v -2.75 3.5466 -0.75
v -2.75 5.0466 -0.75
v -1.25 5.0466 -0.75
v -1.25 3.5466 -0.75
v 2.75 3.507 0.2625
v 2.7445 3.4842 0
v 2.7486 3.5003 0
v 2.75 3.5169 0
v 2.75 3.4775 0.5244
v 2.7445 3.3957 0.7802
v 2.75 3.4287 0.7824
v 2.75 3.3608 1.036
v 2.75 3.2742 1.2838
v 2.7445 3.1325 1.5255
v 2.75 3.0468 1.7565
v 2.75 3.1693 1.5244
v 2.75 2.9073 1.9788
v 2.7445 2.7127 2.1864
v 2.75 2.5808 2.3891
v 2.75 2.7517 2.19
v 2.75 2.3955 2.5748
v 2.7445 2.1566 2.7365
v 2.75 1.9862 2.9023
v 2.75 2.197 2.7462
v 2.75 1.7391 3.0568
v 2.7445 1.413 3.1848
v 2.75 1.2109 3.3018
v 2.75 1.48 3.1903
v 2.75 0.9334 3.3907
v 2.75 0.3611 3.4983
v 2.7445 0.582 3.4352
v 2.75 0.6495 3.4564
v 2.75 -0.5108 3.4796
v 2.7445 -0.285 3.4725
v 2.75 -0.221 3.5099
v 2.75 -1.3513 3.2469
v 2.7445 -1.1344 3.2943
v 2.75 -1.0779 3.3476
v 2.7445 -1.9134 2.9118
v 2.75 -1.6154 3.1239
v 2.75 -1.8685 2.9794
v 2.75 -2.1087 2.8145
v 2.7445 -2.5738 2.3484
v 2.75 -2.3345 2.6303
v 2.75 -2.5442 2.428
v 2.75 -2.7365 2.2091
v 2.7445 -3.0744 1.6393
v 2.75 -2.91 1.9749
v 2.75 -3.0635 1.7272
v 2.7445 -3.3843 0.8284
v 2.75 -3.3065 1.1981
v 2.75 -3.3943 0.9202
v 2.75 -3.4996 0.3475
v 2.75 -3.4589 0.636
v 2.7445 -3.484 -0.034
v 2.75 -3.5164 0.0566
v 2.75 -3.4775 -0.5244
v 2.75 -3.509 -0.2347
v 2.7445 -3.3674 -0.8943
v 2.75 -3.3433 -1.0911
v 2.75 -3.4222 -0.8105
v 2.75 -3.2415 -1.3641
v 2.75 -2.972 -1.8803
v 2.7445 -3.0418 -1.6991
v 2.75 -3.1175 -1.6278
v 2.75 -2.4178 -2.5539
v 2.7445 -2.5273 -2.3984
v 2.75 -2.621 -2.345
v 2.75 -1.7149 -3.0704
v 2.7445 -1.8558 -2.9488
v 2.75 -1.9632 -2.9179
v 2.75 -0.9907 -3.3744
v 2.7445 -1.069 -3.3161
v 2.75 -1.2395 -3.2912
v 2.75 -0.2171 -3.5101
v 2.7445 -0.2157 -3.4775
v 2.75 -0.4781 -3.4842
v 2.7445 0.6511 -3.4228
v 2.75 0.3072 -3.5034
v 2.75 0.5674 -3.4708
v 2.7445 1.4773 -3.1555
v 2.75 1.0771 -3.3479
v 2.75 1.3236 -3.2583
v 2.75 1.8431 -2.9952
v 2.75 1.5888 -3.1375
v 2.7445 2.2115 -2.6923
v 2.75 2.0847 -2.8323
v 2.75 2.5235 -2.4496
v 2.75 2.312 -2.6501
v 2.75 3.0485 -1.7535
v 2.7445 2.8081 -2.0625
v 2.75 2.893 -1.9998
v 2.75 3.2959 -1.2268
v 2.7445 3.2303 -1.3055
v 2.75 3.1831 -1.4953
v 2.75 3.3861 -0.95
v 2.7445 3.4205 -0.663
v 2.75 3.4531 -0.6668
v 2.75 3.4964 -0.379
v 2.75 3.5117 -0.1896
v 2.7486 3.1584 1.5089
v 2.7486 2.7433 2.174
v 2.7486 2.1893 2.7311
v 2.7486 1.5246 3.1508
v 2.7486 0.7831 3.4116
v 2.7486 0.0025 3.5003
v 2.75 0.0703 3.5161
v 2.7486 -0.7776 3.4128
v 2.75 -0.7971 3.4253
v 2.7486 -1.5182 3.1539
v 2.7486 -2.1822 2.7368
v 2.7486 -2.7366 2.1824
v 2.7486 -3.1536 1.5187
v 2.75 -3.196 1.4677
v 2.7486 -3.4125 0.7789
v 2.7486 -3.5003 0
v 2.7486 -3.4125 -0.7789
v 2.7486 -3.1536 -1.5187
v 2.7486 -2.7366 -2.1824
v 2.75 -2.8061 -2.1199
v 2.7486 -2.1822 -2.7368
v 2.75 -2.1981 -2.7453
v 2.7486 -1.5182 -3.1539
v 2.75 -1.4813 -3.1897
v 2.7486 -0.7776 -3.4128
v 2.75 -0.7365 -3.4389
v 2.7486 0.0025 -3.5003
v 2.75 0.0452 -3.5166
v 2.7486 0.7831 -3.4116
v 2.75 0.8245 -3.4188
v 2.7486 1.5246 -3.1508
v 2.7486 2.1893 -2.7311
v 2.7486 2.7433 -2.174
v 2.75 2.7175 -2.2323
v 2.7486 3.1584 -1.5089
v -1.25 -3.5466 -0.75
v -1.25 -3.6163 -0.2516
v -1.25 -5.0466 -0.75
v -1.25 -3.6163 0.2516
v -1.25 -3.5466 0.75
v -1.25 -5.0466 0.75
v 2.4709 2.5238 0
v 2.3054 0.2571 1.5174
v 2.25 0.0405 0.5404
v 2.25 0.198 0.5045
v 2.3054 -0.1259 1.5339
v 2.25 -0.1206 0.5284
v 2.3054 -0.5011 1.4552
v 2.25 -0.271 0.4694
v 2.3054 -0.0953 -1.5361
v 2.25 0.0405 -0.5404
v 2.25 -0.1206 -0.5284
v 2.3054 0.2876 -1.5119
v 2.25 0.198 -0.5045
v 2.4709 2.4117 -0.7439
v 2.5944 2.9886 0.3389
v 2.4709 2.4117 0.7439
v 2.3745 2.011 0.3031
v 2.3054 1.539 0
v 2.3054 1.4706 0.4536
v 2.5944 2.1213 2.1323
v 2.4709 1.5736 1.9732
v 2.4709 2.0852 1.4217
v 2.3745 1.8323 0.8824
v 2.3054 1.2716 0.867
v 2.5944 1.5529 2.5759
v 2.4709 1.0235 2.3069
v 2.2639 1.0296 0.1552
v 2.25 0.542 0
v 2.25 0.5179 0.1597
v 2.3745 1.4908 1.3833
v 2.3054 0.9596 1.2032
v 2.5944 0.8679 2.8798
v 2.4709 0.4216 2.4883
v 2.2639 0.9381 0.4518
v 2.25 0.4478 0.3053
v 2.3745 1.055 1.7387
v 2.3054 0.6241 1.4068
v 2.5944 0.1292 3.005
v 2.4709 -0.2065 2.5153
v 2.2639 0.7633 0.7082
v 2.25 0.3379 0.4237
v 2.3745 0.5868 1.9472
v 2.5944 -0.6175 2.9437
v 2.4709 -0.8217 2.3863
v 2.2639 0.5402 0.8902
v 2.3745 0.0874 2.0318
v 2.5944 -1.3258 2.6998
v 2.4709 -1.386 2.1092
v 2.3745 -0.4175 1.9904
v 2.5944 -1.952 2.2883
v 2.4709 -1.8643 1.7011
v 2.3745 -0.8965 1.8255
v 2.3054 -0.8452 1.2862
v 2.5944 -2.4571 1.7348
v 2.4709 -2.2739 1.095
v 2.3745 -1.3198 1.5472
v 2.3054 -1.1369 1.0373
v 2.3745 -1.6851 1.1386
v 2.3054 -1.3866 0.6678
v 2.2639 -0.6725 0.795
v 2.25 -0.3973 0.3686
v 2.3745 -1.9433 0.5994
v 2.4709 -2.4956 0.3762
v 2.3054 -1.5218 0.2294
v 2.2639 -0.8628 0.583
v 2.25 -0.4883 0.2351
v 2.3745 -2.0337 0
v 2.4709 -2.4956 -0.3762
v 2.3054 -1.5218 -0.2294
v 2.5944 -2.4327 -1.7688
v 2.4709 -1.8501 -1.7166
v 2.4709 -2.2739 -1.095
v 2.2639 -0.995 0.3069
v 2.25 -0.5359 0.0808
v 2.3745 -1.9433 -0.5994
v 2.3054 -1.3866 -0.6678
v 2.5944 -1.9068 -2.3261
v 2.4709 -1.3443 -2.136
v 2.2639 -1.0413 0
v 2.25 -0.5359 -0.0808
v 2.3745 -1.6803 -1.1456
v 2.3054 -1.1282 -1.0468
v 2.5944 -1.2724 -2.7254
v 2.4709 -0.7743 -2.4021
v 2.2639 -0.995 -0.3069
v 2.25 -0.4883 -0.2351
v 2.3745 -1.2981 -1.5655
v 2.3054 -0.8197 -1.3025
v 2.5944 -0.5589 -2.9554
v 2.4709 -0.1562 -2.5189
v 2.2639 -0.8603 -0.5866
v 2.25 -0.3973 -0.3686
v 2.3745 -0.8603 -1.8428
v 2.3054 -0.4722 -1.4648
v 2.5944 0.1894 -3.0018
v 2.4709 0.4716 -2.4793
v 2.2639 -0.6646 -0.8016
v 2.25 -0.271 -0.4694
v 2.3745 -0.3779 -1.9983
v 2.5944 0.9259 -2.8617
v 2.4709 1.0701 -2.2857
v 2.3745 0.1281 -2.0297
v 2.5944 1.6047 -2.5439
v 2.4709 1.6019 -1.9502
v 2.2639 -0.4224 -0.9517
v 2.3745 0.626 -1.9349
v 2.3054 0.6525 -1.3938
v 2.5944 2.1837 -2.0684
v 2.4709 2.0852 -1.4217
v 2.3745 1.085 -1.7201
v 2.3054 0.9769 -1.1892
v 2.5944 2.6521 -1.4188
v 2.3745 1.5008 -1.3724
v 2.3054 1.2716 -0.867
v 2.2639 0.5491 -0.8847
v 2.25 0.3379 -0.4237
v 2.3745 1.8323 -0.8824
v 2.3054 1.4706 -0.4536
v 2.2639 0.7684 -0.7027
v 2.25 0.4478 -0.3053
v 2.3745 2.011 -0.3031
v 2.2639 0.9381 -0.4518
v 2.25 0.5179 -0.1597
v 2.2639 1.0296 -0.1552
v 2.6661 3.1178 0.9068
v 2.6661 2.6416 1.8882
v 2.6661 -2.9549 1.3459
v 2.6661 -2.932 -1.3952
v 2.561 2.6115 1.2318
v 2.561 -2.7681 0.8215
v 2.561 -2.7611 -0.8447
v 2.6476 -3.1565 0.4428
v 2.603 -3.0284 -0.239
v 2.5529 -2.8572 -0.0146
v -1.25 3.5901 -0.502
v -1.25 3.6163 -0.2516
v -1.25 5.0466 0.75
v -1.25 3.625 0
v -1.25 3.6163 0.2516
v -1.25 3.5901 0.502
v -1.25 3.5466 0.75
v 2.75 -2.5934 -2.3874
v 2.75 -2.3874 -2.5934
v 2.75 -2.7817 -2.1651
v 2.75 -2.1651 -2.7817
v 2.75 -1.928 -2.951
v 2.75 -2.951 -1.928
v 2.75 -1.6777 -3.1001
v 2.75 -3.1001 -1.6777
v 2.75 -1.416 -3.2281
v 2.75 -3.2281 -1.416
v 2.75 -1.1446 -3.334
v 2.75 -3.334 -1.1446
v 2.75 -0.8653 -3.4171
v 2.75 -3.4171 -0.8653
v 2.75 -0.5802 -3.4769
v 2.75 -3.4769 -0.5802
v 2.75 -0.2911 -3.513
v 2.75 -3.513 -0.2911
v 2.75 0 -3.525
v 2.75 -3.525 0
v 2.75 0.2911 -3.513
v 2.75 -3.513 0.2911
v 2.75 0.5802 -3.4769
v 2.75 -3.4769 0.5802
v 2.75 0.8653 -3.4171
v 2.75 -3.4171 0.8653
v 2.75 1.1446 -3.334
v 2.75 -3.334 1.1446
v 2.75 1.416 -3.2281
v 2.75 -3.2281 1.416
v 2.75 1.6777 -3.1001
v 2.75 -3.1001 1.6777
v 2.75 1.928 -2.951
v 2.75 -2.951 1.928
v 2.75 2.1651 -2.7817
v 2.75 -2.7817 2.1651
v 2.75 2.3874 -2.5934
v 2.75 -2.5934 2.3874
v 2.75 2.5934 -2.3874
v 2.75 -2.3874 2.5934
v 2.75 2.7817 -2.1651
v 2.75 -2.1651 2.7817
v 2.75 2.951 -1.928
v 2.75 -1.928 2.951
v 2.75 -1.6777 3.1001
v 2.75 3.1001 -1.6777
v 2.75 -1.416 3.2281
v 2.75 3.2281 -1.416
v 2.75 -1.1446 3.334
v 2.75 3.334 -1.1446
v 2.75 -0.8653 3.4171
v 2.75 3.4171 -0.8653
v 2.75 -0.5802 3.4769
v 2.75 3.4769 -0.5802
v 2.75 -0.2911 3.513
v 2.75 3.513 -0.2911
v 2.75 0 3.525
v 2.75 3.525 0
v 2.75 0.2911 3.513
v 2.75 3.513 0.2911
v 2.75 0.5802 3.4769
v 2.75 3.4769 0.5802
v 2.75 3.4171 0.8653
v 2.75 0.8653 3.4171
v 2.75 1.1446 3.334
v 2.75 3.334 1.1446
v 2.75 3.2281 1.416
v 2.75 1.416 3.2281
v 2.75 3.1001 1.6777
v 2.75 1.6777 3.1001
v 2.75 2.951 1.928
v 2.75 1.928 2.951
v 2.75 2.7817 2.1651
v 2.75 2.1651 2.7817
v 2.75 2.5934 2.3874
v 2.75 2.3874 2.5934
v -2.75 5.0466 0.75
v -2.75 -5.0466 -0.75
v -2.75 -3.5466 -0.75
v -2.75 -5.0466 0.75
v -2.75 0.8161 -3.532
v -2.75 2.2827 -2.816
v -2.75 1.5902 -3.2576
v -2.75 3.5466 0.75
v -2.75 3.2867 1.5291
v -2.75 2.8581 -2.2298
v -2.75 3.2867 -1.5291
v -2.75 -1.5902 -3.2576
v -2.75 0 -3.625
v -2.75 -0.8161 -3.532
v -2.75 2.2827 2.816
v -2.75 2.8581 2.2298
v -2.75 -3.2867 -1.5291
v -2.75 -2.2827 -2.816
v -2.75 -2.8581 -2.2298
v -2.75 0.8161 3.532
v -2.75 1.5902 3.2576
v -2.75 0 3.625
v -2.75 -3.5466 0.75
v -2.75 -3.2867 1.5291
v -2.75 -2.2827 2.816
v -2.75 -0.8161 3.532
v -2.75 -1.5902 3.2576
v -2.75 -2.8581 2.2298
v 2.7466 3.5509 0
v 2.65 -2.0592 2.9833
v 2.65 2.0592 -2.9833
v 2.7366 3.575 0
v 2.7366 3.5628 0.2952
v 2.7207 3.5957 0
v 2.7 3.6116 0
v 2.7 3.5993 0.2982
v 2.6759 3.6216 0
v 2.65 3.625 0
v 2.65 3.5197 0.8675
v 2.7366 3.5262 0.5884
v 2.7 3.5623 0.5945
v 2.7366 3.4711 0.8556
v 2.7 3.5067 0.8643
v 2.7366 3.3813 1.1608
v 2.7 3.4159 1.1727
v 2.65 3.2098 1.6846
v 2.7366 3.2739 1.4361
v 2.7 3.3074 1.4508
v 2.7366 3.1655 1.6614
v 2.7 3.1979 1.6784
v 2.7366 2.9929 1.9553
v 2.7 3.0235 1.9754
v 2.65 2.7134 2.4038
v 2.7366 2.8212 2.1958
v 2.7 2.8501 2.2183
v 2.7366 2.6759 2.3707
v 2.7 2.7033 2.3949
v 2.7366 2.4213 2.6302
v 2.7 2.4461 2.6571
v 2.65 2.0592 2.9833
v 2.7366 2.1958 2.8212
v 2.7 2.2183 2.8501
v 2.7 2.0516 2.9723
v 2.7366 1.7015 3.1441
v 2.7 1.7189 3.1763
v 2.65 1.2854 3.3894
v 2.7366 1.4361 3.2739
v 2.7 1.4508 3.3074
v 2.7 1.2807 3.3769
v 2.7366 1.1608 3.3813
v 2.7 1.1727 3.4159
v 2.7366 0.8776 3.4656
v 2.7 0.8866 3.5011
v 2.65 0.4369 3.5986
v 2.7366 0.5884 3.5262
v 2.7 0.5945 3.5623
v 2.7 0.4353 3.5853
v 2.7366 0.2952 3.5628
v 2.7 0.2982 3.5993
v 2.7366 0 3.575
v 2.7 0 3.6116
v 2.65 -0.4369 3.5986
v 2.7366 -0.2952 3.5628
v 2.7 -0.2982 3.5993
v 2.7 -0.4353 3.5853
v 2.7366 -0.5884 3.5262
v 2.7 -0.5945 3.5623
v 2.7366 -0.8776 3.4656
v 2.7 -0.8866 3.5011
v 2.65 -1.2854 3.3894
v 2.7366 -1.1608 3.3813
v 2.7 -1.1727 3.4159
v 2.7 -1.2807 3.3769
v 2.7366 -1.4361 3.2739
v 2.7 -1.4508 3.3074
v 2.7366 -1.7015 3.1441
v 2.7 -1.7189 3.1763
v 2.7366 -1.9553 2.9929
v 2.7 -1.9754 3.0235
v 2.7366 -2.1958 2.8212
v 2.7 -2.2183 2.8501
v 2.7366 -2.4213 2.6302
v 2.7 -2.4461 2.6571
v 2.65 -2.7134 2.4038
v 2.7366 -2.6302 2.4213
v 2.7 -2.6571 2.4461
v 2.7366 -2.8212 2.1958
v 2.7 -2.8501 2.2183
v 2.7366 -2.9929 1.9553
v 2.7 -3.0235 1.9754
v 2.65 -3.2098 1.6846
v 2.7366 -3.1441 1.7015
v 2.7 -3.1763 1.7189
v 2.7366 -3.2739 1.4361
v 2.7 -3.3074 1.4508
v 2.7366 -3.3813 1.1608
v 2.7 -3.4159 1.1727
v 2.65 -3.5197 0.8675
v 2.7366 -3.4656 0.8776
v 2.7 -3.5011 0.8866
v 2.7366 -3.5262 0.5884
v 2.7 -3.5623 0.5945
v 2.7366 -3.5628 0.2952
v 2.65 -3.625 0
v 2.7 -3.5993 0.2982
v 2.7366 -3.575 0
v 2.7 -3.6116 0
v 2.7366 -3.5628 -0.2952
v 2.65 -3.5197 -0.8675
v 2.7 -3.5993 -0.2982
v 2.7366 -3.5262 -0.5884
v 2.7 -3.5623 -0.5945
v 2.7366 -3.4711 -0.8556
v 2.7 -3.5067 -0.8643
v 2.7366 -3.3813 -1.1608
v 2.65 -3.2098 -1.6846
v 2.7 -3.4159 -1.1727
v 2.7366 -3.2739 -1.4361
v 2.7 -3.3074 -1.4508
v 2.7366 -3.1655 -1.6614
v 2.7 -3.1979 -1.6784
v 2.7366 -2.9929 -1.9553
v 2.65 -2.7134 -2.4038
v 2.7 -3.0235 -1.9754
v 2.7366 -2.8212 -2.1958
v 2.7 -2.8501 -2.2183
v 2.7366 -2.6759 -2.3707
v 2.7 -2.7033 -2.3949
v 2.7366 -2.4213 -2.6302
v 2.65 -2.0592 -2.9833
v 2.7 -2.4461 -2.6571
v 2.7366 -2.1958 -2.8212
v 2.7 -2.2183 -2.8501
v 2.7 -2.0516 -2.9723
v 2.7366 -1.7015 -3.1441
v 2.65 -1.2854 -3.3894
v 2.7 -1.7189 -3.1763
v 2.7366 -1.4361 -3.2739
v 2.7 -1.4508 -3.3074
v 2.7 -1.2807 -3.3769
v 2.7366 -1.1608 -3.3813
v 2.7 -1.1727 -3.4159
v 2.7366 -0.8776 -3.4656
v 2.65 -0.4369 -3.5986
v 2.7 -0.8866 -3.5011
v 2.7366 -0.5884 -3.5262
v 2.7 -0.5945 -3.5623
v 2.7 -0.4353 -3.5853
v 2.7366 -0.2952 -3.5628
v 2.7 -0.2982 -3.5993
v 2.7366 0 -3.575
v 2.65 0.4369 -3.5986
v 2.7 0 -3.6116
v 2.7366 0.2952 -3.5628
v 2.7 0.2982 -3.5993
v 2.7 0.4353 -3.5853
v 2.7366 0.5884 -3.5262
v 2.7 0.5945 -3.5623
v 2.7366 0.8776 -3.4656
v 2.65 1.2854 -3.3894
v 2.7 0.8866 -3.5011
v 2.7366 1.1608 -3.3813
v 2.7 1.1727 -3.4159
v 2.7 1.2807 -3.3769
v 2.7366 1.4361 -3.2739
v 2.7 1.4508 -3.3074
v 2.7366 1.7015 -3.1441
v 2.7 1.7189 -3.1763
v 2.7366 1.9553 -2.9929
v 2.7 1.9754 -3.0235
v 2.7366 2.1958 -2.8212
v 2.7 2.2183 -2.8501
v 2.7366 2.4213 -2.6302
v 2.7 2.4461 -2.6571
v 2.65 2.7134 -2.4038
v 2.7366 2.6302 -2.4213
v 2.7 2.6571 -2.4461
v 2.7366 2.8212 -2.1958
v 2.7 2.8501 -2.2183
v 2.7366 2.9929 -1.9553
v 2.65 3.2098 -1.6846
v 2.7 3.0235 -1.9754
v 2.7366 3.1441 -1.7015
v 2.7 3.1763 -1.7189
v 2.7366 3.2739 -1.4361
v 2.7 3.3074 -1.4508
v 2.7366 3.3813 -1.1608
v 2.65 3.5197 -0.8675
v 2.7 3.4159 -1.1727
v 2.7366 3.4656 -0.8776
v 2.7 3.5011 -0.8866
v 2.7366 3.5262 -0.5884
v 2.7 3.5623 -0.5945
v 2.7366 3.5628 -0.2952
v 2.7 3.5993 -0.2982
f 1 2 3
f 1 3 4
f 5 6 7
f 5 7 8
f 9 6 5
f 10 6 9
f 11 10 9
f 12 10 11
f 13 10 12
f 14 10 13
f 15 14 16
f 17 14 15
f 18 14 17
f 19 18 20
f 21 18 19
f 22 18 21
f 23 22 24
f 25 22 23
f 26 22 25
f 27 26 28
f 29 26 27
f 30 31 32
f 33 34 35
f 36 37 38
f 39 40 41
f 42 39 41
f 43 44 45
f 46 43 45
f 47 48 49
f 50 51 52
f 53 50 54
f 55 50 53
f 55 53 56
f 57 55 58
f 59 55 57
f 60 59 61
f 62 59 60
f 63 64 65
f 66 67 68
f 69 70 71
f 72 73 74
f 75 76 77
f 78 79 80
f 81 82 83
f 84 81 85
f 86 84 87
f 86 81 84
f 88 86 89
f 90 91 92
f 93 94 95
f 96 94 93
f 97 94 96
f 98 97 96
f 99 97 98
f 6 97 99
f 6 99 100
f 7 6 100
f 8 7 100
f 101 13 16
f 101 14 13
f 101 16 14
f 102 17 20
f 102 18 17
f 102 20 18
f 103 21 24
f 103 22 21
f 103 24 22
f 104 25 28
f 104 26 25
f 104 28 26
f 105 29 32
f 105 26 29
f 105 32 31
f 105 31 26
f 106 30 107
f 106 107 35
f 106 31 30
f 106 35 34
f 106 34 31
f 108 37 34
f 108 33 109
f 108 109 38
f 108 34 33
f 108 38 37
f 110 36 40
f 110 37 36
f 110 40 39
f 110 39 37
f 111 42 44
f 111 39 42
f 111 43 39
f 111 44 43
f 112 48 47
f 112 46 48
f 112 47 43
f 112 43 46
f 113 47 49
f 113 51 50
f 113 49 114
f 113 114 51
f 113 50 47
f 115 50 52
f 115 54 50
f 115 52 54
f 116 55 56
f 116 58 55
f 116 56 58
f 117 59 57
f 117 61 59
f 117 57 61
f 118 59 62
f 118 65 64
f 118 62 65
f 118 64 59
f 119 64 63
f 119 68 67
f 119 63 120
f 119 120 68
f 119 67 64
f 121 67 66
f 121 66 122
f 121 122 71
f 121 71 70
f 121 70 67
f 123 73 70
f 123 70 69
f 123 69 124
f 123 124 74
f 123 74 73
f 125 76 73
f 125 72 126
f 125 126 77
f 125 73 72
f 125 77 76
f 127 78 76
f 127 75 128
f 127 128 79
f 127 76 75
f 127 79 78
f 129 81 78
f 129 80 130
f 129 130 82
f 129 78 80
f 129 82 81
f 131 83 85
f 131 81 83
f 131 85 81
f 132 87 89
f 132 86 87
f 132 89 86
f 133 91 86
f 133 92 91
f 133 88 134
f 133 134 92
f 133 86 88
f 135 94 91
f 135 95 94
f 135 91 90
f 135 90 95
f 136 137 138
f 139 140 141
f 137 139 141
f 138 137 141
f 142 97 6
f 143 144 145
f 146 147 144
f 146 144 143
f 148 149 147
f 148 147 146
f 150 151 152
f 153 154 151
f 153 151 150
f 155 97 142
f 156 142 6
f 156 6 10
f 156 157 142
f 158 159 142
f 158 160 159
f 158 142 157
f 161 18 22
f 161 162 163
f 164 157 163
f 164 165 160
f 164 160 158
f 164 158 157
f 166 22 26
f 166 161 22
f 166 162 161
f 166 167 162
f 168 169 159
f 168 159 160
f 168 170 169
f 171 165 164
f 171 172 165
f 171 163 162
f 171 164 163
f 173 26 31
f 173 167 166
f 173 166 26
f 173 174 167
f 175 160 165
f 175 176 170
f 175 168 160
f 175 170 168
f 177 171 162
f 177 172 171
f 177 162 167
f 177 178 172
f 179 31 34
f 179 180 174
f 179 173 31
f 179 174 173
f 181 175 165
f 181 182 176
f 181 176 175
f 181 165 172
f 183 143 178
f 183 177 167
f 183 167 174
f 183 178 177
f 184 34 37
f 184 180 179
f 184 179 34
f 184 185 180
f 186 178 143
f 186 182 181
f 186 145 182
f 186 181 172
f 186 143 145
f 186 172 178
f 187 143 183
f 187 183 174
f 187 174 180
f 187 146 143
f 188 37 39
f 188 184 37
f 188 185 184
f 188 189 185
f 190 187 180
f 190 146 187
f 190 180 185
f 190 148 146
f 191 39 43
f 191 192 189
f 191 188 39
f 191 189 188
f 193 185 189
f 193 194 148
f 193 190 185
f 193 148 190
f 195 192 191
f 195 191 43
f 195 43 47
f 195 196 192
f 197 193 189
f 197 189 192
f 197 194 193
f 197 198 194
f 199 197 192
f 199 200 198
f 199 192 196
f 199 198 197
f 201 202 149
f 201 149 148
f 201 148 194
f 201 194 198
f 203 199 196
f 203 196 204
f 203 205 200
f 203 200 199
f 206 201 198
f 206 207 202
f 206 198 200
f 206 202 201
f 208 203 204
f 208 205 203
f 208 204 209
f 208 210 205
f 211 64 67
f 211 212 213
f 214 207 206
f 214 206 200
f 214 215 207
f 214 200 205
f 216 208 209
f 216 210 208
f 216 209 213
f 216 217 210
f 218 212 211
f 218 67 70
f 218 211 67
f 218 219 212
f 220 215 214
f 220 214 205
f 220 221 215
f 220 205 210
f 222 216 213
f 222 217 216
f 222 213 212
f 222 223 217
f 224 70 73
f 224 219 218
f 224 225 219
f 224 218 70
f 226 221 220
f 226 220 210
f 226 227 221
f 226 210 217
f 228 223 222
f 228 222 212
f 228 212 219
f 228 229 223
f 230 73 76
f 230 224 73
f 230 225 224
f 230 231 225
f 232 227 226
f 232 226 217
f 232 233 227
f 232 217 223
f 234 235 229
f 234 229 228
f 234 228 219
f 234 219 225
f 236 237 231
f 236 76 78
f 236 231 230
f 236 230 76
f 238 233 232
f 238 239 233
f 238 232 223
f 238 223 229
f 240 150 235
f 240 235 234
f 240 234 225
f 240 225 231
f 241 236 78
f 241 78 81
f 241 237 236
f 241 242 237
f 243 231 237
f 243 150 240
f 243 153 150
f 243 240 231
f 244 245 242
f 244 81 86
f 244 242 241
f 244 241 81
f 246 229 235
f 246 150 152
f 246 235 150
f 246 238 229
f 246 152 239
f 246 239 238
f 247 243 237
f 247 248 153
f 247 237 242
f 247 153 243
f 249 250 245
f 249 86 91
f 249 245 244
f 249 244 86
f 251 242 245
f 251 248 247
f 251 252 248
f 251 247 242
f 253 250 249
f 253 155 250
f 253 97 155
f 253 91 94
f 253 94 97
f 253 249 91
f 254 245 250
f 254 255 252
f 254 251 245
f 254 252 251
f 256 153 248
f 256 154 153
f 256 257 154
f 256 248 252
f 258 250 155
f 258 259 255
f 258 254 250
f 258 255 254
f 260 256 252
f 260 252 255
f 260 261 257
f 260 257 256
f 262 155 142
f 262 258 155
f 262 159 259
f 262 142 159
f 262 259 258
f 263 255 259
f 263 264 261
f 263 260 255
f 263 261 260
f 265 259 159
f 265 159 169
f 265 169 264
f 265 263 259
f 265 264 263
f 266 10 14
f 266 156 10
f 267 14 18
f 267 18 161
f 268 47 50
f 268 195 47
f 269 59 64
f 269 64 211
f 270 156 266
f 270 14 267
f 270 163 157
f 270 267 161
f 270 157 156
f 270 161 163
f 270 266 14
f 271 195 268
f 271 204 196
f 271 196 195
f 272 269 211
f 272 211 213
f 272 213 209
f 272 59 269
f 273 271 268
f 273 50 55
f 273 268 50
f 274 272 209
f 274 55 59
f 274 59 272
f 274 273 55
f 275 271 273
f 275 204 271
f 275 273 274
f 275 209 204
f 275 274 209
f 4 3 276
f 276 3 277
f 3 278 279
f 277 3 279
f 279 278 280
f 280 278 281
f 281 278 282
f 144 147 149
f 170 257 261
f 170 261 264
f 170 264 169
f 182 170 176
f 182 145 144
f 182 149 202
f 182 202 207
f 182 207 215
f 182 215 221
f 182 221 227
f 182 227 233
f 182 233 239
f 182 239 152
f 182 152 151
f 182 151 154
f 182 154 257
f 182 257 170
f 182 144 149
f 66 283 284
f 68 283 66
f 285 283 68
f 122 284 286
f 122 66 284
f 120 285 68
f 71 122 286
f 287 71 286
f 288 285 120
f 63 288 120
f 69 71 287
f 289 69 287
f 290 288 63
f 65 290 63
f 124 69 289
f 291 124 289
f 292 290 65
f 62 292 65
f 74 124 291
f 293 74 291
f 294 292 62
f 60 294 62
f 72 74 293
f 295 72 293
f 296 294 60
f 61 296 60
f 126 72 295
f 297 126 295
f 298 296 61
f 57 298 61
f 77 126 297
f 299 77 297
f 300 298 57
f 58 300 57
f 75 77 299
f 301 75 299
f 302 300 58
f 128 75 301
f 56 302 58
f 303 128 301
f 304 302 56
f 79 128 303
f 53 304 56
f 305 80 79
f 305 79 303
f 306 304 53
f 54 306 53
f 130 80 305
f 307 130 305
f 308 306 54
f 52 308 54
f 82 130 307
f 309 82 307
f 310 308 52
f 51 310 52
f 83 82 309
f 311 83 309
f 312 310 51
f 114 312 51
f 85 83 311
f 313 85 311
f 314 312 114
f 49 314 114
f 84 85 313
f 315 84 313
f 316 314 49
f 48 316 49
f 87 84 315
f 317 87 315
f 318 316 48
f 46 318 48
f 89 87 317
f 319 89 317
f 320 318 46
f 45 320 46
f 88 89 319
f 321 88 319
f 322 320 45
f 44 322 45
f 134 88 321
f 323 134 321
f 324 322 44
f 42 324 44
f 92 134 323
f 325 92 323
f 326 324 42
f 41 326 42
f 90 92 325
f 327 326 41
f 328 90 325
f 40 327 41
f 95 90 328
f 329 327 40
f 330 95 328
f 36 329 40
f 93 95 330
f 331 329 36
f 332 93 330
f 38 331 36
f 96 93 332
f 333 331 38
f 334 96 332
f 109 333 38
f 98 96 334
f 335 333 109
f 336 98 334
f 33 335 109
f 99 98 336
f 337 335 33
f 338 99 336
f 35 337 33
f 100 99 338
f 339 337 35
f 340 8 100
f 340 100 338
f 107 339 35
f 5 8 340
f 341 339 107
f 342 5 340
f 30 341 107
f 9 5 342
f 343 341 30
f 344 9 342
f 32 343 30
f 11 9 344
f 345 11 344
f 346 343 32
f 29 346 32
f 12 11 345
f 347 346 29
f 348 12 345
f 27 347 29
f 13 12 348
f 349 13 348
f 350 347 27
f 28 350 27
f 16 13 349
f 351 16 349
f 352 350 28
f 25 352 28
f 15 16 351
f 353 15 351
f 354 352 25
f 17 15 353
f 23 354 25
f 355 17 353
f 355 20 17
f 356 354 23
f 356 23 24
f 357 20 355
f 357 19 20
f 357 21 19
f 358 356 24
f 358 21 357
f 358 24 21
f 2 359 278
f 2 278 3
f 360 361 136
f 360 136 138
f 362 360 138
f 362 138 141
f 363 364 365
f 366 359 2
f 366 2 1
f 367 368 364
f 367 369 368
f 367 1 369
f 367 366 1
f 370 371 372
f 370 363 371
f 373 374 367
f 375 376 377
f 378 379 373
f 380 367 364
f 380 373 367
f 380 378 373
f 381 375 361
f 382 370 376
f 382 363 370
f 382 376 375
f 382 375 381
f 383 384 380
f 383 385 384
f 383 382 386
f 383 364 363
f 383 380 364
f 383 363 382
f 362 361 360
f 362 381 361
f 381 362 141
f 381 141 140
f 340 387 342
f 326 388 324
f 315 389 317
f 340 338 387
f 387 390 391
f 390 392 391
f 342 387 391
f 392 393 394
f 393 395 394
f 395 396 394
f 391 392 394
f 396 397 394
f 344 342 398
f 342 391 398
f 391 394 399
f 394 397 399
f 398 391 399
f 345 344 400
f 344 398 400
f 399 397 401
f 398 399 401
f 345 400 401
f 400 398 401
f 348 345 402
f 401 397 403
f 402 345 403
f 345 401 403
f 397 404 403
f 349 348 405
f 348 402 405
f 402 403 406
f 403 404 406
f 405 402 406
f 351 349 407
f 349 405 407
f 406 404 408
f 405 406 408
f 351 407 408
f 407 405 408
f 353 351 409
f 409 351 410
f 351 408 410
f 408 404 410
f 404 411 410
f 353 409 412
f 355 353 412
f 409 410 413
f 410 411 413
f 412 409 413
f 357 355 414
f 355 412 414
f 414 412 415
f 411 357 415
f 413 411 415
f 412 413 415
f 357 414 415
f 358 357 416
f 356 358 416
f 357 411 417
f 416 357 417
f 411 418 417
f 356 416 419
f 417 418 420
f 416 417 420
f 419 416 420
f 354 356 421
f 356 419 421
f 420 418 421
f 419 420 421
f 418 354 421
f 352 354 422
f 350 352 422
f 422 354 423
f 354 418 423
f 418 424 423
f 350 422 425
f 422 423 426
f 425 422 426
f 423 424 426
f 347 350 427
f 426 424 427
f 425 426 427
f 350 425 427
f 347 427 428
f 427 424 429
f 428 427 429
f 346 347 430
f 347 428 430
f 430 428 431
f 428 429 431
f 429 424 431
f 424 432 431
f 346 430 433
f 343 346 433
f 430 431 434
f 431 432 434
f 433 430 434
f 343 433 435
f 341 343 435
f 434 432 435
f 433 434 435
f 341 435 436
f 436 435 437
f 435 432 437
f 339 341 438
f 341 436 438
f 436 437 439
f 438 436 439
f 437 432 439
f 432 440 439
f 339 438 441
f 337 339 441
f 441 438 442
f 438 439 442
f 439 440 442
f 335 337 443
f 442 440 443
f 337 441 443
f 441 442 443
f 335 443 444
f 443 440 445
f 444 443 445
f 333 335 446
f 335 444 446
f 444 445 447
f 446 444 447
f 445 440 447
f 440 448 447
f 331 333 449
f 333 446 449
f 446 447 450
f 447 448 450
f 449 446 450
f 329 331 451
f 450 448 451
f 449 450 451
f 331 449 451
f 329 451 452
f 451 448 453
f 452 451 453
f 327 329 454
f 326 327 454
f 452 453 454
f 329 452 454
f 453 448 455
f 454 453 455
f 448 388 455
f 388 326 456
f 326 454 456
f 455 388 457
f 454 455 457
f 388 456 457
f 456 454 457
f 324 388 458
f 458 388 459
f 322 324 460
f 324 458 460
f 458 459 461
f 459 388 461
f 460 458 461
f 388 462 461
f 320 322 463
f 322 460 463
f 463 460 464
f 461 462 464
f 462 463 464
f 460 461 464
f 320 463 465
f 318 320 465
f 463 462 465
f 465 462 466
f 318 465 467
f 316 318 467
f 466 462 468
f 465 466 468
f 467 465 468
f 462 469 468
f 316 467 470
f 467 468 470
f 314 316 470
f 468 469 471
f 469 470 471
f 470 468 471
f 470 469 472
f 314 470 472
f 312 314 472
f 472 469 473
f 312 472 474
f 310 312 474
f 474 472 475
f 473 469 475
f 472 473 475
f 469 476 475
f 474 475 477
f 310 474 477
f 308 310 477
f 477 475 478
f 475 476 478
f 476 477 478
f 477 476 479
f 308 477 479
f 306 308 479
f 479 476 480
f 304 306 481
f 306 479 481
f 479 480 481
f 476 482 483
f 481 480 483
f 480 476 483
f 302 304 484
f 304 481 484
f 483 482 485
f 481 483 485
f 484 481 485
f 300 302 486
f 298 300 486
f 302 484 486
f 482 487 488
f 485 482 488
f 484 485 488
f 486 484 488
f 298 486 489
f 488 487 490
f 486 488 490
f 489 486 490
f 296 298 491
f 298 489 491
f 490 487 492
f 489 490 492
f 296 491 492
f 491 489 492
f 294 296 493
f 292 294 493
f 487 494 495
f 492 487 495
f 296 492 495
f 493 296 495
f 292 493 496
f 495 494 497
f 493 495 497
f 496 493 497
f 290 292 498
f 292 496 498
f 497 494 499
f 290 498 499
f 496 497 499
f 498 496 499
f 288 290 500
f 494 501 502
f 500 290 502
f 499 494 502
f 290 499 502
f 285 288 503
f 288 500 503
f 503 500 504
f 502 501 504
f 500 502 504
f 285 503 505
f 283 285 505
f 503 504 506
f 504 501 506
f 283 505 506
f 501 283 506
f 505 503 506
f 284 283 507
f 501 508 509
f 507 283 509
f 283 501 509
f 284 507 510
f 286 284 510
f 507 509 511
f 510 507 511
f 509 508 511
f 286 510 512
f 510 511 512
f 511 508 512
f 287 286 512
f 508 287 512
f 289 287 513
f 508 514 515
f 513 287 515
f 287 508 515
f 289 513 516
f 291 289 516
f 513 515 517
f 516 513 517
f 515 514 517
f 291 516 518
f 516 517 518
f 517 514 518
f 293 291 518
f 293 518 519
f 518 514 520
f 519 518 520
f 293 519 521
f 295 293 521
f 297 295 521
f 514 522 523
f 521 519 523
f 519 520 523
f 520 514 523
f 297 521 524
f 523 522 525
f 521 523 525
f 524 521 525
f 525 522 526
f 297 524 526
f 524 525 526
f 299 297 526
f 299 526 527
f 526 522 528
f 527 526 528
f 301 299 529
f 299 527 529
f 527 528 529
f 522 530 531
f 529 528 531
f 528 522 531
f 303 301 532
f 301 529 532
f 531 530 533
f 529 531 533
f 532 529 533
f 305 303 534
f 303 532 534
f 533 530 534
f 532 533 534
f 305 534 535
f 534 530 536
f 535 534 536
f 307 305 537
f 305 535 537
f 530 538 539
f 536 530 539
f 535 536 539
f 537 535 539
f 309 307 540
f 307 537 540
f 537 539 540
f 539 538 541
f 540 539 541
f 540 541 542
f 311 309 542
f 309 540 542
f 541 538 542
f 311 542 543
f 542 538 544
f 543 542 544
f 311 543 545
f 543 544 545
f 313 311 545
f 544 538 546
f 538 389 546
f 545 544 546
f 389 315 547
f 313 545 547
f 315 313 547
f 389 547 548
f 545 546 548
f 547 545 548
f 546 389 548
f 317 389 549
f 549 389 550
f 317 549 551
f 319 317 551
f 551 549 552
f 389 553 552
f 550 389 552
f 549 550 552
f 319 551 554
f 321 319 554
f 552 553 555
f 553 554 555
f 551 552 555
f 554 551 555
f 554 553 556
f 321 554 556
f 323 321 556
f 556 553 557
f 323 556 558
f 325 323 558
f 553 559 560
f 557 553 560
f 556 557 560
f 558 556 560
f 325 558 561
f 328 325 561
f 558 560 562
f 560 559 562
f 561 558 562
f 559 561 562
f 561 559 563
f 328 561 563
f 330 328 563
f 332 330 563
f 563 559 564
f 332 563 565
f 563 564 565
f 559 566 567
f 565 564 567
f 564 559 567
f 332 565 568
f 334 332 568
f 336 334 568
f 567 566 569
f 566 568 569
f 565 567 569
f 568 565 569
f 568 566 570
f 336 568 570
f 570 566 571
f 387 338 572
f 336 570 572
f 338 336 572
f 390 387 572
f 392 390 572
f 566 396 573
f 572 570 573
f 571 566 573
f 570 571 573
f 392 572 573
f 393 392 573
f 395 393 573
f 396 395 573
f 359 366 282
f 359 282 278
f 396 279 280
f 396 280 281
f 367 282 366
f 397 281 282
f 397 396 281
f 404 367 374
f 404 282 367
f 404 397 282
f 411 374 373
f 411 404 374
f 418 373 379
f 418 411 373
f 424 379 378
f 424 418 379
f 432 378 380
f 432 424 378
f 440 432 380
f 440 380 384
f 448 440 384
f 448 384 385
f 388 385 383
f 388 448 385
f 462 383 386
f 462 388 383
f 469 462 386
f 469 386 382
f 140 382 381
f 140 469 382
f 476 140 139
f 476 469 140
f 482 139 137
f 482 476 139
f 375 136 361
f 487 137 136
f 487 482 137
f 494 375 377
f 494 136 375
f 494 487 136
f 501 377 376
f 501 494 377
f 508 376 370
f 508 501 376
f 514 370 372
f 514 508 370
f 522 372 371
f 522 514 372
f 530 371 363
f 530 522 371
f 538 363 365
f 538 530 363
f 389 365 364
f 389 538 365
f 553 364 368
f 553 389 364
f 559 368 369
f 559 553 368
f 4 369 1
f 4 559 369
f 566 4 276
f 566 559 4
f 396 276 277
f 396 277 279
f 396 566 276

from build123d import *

# Parameters (mm, degrees)
F0_R     = 3.625
F1_DEPTH = 2.75
F3_DEPTH = 1.5
F4_R     = 3.5
F5_DEPTH = 0.5
F7_R     = 0.1


# Not quite as in the source:
# - a fillet or chamfer that OpenCascade refuses, or shapes differently, is made with other operations: its cross-section is extruded or revolved along the edge and cut away or added


with BuildPart() as f1:
    # F0 (on Right) → F1 (new body, symmetric)
    with BuildSketch(Plane.YZ):
        Circle(F0_R)
    extrude(amount=F1_DEPTH, both=True)

    # F2 (on face) → F3 (join)
    with BuildSketch(Plane(origin=(-2.75, 0, 0), x_dir=(0, -1, 0), z_dir=(-1, 0, 0))):
        with BuildLine():
            Line((3.5465652398, -0.75), (5.0465652398, -0.75))
            Line((5.0465652398, -0.75), (5.0465652398, 0.75))
            Line((5.0465652398, 0.75), (3.5465652398, 0.75))
            ThreePointArc((3.5465652398, 0.75), (3.625, 0), (3.5465652398, -0.75))
        make_face()
        with BuildLine():
            Line((-3.5465652398, 0.75), (-5.0465652398, 0.75))
            Line((-5.0465652398, 0.75), (-5.0465652398, -0.75))
            Line((-5.0465652398, -0.75), (-3.5465652398, -0.75))
            ThreePointArc((-3.5465652398, -0.75), (-3.625, 0), (-3.5465652398, 0.75))
        make_face()
    extrude(amount=-F3_DEPTH)

    # F4 (on face) → F5 (cut)
    with BuildSketch(Plane.YZ.offset(2.75)):
        Circle(F4_R)
    extrude(amount=-F5_DEPTH, mode=Mode.SUBTRACT)

    # F6: fillet of radius 9 on 1 edges, made by hand

    # F6_s1 → F6_t2 (revolve)
    with BuildSketch(Plane.XY):
        with BuildLine():
            ThreePointArc((2.75, 3.5), (2.3758803254, 2.0419601084), (2.25, 0.5419601084))
            Line((2.25, 0.5419601084), (2.25, 3.5))
            Line((2.25, 3.5), (2.75, 3.5))
        make_face()
    revolve(axis=Axis((2.25, 0, 0), (1, 0, 0)))

    # F7
    f7_edges = [f1.edges().sort_by_distance(p)[0] for p in [
        (2.75, -3.5, 0),
        (2.75, -3.625, 0),
    ]]
    fillet(f7_edges, radius=F7_R)


solid = f1.part
